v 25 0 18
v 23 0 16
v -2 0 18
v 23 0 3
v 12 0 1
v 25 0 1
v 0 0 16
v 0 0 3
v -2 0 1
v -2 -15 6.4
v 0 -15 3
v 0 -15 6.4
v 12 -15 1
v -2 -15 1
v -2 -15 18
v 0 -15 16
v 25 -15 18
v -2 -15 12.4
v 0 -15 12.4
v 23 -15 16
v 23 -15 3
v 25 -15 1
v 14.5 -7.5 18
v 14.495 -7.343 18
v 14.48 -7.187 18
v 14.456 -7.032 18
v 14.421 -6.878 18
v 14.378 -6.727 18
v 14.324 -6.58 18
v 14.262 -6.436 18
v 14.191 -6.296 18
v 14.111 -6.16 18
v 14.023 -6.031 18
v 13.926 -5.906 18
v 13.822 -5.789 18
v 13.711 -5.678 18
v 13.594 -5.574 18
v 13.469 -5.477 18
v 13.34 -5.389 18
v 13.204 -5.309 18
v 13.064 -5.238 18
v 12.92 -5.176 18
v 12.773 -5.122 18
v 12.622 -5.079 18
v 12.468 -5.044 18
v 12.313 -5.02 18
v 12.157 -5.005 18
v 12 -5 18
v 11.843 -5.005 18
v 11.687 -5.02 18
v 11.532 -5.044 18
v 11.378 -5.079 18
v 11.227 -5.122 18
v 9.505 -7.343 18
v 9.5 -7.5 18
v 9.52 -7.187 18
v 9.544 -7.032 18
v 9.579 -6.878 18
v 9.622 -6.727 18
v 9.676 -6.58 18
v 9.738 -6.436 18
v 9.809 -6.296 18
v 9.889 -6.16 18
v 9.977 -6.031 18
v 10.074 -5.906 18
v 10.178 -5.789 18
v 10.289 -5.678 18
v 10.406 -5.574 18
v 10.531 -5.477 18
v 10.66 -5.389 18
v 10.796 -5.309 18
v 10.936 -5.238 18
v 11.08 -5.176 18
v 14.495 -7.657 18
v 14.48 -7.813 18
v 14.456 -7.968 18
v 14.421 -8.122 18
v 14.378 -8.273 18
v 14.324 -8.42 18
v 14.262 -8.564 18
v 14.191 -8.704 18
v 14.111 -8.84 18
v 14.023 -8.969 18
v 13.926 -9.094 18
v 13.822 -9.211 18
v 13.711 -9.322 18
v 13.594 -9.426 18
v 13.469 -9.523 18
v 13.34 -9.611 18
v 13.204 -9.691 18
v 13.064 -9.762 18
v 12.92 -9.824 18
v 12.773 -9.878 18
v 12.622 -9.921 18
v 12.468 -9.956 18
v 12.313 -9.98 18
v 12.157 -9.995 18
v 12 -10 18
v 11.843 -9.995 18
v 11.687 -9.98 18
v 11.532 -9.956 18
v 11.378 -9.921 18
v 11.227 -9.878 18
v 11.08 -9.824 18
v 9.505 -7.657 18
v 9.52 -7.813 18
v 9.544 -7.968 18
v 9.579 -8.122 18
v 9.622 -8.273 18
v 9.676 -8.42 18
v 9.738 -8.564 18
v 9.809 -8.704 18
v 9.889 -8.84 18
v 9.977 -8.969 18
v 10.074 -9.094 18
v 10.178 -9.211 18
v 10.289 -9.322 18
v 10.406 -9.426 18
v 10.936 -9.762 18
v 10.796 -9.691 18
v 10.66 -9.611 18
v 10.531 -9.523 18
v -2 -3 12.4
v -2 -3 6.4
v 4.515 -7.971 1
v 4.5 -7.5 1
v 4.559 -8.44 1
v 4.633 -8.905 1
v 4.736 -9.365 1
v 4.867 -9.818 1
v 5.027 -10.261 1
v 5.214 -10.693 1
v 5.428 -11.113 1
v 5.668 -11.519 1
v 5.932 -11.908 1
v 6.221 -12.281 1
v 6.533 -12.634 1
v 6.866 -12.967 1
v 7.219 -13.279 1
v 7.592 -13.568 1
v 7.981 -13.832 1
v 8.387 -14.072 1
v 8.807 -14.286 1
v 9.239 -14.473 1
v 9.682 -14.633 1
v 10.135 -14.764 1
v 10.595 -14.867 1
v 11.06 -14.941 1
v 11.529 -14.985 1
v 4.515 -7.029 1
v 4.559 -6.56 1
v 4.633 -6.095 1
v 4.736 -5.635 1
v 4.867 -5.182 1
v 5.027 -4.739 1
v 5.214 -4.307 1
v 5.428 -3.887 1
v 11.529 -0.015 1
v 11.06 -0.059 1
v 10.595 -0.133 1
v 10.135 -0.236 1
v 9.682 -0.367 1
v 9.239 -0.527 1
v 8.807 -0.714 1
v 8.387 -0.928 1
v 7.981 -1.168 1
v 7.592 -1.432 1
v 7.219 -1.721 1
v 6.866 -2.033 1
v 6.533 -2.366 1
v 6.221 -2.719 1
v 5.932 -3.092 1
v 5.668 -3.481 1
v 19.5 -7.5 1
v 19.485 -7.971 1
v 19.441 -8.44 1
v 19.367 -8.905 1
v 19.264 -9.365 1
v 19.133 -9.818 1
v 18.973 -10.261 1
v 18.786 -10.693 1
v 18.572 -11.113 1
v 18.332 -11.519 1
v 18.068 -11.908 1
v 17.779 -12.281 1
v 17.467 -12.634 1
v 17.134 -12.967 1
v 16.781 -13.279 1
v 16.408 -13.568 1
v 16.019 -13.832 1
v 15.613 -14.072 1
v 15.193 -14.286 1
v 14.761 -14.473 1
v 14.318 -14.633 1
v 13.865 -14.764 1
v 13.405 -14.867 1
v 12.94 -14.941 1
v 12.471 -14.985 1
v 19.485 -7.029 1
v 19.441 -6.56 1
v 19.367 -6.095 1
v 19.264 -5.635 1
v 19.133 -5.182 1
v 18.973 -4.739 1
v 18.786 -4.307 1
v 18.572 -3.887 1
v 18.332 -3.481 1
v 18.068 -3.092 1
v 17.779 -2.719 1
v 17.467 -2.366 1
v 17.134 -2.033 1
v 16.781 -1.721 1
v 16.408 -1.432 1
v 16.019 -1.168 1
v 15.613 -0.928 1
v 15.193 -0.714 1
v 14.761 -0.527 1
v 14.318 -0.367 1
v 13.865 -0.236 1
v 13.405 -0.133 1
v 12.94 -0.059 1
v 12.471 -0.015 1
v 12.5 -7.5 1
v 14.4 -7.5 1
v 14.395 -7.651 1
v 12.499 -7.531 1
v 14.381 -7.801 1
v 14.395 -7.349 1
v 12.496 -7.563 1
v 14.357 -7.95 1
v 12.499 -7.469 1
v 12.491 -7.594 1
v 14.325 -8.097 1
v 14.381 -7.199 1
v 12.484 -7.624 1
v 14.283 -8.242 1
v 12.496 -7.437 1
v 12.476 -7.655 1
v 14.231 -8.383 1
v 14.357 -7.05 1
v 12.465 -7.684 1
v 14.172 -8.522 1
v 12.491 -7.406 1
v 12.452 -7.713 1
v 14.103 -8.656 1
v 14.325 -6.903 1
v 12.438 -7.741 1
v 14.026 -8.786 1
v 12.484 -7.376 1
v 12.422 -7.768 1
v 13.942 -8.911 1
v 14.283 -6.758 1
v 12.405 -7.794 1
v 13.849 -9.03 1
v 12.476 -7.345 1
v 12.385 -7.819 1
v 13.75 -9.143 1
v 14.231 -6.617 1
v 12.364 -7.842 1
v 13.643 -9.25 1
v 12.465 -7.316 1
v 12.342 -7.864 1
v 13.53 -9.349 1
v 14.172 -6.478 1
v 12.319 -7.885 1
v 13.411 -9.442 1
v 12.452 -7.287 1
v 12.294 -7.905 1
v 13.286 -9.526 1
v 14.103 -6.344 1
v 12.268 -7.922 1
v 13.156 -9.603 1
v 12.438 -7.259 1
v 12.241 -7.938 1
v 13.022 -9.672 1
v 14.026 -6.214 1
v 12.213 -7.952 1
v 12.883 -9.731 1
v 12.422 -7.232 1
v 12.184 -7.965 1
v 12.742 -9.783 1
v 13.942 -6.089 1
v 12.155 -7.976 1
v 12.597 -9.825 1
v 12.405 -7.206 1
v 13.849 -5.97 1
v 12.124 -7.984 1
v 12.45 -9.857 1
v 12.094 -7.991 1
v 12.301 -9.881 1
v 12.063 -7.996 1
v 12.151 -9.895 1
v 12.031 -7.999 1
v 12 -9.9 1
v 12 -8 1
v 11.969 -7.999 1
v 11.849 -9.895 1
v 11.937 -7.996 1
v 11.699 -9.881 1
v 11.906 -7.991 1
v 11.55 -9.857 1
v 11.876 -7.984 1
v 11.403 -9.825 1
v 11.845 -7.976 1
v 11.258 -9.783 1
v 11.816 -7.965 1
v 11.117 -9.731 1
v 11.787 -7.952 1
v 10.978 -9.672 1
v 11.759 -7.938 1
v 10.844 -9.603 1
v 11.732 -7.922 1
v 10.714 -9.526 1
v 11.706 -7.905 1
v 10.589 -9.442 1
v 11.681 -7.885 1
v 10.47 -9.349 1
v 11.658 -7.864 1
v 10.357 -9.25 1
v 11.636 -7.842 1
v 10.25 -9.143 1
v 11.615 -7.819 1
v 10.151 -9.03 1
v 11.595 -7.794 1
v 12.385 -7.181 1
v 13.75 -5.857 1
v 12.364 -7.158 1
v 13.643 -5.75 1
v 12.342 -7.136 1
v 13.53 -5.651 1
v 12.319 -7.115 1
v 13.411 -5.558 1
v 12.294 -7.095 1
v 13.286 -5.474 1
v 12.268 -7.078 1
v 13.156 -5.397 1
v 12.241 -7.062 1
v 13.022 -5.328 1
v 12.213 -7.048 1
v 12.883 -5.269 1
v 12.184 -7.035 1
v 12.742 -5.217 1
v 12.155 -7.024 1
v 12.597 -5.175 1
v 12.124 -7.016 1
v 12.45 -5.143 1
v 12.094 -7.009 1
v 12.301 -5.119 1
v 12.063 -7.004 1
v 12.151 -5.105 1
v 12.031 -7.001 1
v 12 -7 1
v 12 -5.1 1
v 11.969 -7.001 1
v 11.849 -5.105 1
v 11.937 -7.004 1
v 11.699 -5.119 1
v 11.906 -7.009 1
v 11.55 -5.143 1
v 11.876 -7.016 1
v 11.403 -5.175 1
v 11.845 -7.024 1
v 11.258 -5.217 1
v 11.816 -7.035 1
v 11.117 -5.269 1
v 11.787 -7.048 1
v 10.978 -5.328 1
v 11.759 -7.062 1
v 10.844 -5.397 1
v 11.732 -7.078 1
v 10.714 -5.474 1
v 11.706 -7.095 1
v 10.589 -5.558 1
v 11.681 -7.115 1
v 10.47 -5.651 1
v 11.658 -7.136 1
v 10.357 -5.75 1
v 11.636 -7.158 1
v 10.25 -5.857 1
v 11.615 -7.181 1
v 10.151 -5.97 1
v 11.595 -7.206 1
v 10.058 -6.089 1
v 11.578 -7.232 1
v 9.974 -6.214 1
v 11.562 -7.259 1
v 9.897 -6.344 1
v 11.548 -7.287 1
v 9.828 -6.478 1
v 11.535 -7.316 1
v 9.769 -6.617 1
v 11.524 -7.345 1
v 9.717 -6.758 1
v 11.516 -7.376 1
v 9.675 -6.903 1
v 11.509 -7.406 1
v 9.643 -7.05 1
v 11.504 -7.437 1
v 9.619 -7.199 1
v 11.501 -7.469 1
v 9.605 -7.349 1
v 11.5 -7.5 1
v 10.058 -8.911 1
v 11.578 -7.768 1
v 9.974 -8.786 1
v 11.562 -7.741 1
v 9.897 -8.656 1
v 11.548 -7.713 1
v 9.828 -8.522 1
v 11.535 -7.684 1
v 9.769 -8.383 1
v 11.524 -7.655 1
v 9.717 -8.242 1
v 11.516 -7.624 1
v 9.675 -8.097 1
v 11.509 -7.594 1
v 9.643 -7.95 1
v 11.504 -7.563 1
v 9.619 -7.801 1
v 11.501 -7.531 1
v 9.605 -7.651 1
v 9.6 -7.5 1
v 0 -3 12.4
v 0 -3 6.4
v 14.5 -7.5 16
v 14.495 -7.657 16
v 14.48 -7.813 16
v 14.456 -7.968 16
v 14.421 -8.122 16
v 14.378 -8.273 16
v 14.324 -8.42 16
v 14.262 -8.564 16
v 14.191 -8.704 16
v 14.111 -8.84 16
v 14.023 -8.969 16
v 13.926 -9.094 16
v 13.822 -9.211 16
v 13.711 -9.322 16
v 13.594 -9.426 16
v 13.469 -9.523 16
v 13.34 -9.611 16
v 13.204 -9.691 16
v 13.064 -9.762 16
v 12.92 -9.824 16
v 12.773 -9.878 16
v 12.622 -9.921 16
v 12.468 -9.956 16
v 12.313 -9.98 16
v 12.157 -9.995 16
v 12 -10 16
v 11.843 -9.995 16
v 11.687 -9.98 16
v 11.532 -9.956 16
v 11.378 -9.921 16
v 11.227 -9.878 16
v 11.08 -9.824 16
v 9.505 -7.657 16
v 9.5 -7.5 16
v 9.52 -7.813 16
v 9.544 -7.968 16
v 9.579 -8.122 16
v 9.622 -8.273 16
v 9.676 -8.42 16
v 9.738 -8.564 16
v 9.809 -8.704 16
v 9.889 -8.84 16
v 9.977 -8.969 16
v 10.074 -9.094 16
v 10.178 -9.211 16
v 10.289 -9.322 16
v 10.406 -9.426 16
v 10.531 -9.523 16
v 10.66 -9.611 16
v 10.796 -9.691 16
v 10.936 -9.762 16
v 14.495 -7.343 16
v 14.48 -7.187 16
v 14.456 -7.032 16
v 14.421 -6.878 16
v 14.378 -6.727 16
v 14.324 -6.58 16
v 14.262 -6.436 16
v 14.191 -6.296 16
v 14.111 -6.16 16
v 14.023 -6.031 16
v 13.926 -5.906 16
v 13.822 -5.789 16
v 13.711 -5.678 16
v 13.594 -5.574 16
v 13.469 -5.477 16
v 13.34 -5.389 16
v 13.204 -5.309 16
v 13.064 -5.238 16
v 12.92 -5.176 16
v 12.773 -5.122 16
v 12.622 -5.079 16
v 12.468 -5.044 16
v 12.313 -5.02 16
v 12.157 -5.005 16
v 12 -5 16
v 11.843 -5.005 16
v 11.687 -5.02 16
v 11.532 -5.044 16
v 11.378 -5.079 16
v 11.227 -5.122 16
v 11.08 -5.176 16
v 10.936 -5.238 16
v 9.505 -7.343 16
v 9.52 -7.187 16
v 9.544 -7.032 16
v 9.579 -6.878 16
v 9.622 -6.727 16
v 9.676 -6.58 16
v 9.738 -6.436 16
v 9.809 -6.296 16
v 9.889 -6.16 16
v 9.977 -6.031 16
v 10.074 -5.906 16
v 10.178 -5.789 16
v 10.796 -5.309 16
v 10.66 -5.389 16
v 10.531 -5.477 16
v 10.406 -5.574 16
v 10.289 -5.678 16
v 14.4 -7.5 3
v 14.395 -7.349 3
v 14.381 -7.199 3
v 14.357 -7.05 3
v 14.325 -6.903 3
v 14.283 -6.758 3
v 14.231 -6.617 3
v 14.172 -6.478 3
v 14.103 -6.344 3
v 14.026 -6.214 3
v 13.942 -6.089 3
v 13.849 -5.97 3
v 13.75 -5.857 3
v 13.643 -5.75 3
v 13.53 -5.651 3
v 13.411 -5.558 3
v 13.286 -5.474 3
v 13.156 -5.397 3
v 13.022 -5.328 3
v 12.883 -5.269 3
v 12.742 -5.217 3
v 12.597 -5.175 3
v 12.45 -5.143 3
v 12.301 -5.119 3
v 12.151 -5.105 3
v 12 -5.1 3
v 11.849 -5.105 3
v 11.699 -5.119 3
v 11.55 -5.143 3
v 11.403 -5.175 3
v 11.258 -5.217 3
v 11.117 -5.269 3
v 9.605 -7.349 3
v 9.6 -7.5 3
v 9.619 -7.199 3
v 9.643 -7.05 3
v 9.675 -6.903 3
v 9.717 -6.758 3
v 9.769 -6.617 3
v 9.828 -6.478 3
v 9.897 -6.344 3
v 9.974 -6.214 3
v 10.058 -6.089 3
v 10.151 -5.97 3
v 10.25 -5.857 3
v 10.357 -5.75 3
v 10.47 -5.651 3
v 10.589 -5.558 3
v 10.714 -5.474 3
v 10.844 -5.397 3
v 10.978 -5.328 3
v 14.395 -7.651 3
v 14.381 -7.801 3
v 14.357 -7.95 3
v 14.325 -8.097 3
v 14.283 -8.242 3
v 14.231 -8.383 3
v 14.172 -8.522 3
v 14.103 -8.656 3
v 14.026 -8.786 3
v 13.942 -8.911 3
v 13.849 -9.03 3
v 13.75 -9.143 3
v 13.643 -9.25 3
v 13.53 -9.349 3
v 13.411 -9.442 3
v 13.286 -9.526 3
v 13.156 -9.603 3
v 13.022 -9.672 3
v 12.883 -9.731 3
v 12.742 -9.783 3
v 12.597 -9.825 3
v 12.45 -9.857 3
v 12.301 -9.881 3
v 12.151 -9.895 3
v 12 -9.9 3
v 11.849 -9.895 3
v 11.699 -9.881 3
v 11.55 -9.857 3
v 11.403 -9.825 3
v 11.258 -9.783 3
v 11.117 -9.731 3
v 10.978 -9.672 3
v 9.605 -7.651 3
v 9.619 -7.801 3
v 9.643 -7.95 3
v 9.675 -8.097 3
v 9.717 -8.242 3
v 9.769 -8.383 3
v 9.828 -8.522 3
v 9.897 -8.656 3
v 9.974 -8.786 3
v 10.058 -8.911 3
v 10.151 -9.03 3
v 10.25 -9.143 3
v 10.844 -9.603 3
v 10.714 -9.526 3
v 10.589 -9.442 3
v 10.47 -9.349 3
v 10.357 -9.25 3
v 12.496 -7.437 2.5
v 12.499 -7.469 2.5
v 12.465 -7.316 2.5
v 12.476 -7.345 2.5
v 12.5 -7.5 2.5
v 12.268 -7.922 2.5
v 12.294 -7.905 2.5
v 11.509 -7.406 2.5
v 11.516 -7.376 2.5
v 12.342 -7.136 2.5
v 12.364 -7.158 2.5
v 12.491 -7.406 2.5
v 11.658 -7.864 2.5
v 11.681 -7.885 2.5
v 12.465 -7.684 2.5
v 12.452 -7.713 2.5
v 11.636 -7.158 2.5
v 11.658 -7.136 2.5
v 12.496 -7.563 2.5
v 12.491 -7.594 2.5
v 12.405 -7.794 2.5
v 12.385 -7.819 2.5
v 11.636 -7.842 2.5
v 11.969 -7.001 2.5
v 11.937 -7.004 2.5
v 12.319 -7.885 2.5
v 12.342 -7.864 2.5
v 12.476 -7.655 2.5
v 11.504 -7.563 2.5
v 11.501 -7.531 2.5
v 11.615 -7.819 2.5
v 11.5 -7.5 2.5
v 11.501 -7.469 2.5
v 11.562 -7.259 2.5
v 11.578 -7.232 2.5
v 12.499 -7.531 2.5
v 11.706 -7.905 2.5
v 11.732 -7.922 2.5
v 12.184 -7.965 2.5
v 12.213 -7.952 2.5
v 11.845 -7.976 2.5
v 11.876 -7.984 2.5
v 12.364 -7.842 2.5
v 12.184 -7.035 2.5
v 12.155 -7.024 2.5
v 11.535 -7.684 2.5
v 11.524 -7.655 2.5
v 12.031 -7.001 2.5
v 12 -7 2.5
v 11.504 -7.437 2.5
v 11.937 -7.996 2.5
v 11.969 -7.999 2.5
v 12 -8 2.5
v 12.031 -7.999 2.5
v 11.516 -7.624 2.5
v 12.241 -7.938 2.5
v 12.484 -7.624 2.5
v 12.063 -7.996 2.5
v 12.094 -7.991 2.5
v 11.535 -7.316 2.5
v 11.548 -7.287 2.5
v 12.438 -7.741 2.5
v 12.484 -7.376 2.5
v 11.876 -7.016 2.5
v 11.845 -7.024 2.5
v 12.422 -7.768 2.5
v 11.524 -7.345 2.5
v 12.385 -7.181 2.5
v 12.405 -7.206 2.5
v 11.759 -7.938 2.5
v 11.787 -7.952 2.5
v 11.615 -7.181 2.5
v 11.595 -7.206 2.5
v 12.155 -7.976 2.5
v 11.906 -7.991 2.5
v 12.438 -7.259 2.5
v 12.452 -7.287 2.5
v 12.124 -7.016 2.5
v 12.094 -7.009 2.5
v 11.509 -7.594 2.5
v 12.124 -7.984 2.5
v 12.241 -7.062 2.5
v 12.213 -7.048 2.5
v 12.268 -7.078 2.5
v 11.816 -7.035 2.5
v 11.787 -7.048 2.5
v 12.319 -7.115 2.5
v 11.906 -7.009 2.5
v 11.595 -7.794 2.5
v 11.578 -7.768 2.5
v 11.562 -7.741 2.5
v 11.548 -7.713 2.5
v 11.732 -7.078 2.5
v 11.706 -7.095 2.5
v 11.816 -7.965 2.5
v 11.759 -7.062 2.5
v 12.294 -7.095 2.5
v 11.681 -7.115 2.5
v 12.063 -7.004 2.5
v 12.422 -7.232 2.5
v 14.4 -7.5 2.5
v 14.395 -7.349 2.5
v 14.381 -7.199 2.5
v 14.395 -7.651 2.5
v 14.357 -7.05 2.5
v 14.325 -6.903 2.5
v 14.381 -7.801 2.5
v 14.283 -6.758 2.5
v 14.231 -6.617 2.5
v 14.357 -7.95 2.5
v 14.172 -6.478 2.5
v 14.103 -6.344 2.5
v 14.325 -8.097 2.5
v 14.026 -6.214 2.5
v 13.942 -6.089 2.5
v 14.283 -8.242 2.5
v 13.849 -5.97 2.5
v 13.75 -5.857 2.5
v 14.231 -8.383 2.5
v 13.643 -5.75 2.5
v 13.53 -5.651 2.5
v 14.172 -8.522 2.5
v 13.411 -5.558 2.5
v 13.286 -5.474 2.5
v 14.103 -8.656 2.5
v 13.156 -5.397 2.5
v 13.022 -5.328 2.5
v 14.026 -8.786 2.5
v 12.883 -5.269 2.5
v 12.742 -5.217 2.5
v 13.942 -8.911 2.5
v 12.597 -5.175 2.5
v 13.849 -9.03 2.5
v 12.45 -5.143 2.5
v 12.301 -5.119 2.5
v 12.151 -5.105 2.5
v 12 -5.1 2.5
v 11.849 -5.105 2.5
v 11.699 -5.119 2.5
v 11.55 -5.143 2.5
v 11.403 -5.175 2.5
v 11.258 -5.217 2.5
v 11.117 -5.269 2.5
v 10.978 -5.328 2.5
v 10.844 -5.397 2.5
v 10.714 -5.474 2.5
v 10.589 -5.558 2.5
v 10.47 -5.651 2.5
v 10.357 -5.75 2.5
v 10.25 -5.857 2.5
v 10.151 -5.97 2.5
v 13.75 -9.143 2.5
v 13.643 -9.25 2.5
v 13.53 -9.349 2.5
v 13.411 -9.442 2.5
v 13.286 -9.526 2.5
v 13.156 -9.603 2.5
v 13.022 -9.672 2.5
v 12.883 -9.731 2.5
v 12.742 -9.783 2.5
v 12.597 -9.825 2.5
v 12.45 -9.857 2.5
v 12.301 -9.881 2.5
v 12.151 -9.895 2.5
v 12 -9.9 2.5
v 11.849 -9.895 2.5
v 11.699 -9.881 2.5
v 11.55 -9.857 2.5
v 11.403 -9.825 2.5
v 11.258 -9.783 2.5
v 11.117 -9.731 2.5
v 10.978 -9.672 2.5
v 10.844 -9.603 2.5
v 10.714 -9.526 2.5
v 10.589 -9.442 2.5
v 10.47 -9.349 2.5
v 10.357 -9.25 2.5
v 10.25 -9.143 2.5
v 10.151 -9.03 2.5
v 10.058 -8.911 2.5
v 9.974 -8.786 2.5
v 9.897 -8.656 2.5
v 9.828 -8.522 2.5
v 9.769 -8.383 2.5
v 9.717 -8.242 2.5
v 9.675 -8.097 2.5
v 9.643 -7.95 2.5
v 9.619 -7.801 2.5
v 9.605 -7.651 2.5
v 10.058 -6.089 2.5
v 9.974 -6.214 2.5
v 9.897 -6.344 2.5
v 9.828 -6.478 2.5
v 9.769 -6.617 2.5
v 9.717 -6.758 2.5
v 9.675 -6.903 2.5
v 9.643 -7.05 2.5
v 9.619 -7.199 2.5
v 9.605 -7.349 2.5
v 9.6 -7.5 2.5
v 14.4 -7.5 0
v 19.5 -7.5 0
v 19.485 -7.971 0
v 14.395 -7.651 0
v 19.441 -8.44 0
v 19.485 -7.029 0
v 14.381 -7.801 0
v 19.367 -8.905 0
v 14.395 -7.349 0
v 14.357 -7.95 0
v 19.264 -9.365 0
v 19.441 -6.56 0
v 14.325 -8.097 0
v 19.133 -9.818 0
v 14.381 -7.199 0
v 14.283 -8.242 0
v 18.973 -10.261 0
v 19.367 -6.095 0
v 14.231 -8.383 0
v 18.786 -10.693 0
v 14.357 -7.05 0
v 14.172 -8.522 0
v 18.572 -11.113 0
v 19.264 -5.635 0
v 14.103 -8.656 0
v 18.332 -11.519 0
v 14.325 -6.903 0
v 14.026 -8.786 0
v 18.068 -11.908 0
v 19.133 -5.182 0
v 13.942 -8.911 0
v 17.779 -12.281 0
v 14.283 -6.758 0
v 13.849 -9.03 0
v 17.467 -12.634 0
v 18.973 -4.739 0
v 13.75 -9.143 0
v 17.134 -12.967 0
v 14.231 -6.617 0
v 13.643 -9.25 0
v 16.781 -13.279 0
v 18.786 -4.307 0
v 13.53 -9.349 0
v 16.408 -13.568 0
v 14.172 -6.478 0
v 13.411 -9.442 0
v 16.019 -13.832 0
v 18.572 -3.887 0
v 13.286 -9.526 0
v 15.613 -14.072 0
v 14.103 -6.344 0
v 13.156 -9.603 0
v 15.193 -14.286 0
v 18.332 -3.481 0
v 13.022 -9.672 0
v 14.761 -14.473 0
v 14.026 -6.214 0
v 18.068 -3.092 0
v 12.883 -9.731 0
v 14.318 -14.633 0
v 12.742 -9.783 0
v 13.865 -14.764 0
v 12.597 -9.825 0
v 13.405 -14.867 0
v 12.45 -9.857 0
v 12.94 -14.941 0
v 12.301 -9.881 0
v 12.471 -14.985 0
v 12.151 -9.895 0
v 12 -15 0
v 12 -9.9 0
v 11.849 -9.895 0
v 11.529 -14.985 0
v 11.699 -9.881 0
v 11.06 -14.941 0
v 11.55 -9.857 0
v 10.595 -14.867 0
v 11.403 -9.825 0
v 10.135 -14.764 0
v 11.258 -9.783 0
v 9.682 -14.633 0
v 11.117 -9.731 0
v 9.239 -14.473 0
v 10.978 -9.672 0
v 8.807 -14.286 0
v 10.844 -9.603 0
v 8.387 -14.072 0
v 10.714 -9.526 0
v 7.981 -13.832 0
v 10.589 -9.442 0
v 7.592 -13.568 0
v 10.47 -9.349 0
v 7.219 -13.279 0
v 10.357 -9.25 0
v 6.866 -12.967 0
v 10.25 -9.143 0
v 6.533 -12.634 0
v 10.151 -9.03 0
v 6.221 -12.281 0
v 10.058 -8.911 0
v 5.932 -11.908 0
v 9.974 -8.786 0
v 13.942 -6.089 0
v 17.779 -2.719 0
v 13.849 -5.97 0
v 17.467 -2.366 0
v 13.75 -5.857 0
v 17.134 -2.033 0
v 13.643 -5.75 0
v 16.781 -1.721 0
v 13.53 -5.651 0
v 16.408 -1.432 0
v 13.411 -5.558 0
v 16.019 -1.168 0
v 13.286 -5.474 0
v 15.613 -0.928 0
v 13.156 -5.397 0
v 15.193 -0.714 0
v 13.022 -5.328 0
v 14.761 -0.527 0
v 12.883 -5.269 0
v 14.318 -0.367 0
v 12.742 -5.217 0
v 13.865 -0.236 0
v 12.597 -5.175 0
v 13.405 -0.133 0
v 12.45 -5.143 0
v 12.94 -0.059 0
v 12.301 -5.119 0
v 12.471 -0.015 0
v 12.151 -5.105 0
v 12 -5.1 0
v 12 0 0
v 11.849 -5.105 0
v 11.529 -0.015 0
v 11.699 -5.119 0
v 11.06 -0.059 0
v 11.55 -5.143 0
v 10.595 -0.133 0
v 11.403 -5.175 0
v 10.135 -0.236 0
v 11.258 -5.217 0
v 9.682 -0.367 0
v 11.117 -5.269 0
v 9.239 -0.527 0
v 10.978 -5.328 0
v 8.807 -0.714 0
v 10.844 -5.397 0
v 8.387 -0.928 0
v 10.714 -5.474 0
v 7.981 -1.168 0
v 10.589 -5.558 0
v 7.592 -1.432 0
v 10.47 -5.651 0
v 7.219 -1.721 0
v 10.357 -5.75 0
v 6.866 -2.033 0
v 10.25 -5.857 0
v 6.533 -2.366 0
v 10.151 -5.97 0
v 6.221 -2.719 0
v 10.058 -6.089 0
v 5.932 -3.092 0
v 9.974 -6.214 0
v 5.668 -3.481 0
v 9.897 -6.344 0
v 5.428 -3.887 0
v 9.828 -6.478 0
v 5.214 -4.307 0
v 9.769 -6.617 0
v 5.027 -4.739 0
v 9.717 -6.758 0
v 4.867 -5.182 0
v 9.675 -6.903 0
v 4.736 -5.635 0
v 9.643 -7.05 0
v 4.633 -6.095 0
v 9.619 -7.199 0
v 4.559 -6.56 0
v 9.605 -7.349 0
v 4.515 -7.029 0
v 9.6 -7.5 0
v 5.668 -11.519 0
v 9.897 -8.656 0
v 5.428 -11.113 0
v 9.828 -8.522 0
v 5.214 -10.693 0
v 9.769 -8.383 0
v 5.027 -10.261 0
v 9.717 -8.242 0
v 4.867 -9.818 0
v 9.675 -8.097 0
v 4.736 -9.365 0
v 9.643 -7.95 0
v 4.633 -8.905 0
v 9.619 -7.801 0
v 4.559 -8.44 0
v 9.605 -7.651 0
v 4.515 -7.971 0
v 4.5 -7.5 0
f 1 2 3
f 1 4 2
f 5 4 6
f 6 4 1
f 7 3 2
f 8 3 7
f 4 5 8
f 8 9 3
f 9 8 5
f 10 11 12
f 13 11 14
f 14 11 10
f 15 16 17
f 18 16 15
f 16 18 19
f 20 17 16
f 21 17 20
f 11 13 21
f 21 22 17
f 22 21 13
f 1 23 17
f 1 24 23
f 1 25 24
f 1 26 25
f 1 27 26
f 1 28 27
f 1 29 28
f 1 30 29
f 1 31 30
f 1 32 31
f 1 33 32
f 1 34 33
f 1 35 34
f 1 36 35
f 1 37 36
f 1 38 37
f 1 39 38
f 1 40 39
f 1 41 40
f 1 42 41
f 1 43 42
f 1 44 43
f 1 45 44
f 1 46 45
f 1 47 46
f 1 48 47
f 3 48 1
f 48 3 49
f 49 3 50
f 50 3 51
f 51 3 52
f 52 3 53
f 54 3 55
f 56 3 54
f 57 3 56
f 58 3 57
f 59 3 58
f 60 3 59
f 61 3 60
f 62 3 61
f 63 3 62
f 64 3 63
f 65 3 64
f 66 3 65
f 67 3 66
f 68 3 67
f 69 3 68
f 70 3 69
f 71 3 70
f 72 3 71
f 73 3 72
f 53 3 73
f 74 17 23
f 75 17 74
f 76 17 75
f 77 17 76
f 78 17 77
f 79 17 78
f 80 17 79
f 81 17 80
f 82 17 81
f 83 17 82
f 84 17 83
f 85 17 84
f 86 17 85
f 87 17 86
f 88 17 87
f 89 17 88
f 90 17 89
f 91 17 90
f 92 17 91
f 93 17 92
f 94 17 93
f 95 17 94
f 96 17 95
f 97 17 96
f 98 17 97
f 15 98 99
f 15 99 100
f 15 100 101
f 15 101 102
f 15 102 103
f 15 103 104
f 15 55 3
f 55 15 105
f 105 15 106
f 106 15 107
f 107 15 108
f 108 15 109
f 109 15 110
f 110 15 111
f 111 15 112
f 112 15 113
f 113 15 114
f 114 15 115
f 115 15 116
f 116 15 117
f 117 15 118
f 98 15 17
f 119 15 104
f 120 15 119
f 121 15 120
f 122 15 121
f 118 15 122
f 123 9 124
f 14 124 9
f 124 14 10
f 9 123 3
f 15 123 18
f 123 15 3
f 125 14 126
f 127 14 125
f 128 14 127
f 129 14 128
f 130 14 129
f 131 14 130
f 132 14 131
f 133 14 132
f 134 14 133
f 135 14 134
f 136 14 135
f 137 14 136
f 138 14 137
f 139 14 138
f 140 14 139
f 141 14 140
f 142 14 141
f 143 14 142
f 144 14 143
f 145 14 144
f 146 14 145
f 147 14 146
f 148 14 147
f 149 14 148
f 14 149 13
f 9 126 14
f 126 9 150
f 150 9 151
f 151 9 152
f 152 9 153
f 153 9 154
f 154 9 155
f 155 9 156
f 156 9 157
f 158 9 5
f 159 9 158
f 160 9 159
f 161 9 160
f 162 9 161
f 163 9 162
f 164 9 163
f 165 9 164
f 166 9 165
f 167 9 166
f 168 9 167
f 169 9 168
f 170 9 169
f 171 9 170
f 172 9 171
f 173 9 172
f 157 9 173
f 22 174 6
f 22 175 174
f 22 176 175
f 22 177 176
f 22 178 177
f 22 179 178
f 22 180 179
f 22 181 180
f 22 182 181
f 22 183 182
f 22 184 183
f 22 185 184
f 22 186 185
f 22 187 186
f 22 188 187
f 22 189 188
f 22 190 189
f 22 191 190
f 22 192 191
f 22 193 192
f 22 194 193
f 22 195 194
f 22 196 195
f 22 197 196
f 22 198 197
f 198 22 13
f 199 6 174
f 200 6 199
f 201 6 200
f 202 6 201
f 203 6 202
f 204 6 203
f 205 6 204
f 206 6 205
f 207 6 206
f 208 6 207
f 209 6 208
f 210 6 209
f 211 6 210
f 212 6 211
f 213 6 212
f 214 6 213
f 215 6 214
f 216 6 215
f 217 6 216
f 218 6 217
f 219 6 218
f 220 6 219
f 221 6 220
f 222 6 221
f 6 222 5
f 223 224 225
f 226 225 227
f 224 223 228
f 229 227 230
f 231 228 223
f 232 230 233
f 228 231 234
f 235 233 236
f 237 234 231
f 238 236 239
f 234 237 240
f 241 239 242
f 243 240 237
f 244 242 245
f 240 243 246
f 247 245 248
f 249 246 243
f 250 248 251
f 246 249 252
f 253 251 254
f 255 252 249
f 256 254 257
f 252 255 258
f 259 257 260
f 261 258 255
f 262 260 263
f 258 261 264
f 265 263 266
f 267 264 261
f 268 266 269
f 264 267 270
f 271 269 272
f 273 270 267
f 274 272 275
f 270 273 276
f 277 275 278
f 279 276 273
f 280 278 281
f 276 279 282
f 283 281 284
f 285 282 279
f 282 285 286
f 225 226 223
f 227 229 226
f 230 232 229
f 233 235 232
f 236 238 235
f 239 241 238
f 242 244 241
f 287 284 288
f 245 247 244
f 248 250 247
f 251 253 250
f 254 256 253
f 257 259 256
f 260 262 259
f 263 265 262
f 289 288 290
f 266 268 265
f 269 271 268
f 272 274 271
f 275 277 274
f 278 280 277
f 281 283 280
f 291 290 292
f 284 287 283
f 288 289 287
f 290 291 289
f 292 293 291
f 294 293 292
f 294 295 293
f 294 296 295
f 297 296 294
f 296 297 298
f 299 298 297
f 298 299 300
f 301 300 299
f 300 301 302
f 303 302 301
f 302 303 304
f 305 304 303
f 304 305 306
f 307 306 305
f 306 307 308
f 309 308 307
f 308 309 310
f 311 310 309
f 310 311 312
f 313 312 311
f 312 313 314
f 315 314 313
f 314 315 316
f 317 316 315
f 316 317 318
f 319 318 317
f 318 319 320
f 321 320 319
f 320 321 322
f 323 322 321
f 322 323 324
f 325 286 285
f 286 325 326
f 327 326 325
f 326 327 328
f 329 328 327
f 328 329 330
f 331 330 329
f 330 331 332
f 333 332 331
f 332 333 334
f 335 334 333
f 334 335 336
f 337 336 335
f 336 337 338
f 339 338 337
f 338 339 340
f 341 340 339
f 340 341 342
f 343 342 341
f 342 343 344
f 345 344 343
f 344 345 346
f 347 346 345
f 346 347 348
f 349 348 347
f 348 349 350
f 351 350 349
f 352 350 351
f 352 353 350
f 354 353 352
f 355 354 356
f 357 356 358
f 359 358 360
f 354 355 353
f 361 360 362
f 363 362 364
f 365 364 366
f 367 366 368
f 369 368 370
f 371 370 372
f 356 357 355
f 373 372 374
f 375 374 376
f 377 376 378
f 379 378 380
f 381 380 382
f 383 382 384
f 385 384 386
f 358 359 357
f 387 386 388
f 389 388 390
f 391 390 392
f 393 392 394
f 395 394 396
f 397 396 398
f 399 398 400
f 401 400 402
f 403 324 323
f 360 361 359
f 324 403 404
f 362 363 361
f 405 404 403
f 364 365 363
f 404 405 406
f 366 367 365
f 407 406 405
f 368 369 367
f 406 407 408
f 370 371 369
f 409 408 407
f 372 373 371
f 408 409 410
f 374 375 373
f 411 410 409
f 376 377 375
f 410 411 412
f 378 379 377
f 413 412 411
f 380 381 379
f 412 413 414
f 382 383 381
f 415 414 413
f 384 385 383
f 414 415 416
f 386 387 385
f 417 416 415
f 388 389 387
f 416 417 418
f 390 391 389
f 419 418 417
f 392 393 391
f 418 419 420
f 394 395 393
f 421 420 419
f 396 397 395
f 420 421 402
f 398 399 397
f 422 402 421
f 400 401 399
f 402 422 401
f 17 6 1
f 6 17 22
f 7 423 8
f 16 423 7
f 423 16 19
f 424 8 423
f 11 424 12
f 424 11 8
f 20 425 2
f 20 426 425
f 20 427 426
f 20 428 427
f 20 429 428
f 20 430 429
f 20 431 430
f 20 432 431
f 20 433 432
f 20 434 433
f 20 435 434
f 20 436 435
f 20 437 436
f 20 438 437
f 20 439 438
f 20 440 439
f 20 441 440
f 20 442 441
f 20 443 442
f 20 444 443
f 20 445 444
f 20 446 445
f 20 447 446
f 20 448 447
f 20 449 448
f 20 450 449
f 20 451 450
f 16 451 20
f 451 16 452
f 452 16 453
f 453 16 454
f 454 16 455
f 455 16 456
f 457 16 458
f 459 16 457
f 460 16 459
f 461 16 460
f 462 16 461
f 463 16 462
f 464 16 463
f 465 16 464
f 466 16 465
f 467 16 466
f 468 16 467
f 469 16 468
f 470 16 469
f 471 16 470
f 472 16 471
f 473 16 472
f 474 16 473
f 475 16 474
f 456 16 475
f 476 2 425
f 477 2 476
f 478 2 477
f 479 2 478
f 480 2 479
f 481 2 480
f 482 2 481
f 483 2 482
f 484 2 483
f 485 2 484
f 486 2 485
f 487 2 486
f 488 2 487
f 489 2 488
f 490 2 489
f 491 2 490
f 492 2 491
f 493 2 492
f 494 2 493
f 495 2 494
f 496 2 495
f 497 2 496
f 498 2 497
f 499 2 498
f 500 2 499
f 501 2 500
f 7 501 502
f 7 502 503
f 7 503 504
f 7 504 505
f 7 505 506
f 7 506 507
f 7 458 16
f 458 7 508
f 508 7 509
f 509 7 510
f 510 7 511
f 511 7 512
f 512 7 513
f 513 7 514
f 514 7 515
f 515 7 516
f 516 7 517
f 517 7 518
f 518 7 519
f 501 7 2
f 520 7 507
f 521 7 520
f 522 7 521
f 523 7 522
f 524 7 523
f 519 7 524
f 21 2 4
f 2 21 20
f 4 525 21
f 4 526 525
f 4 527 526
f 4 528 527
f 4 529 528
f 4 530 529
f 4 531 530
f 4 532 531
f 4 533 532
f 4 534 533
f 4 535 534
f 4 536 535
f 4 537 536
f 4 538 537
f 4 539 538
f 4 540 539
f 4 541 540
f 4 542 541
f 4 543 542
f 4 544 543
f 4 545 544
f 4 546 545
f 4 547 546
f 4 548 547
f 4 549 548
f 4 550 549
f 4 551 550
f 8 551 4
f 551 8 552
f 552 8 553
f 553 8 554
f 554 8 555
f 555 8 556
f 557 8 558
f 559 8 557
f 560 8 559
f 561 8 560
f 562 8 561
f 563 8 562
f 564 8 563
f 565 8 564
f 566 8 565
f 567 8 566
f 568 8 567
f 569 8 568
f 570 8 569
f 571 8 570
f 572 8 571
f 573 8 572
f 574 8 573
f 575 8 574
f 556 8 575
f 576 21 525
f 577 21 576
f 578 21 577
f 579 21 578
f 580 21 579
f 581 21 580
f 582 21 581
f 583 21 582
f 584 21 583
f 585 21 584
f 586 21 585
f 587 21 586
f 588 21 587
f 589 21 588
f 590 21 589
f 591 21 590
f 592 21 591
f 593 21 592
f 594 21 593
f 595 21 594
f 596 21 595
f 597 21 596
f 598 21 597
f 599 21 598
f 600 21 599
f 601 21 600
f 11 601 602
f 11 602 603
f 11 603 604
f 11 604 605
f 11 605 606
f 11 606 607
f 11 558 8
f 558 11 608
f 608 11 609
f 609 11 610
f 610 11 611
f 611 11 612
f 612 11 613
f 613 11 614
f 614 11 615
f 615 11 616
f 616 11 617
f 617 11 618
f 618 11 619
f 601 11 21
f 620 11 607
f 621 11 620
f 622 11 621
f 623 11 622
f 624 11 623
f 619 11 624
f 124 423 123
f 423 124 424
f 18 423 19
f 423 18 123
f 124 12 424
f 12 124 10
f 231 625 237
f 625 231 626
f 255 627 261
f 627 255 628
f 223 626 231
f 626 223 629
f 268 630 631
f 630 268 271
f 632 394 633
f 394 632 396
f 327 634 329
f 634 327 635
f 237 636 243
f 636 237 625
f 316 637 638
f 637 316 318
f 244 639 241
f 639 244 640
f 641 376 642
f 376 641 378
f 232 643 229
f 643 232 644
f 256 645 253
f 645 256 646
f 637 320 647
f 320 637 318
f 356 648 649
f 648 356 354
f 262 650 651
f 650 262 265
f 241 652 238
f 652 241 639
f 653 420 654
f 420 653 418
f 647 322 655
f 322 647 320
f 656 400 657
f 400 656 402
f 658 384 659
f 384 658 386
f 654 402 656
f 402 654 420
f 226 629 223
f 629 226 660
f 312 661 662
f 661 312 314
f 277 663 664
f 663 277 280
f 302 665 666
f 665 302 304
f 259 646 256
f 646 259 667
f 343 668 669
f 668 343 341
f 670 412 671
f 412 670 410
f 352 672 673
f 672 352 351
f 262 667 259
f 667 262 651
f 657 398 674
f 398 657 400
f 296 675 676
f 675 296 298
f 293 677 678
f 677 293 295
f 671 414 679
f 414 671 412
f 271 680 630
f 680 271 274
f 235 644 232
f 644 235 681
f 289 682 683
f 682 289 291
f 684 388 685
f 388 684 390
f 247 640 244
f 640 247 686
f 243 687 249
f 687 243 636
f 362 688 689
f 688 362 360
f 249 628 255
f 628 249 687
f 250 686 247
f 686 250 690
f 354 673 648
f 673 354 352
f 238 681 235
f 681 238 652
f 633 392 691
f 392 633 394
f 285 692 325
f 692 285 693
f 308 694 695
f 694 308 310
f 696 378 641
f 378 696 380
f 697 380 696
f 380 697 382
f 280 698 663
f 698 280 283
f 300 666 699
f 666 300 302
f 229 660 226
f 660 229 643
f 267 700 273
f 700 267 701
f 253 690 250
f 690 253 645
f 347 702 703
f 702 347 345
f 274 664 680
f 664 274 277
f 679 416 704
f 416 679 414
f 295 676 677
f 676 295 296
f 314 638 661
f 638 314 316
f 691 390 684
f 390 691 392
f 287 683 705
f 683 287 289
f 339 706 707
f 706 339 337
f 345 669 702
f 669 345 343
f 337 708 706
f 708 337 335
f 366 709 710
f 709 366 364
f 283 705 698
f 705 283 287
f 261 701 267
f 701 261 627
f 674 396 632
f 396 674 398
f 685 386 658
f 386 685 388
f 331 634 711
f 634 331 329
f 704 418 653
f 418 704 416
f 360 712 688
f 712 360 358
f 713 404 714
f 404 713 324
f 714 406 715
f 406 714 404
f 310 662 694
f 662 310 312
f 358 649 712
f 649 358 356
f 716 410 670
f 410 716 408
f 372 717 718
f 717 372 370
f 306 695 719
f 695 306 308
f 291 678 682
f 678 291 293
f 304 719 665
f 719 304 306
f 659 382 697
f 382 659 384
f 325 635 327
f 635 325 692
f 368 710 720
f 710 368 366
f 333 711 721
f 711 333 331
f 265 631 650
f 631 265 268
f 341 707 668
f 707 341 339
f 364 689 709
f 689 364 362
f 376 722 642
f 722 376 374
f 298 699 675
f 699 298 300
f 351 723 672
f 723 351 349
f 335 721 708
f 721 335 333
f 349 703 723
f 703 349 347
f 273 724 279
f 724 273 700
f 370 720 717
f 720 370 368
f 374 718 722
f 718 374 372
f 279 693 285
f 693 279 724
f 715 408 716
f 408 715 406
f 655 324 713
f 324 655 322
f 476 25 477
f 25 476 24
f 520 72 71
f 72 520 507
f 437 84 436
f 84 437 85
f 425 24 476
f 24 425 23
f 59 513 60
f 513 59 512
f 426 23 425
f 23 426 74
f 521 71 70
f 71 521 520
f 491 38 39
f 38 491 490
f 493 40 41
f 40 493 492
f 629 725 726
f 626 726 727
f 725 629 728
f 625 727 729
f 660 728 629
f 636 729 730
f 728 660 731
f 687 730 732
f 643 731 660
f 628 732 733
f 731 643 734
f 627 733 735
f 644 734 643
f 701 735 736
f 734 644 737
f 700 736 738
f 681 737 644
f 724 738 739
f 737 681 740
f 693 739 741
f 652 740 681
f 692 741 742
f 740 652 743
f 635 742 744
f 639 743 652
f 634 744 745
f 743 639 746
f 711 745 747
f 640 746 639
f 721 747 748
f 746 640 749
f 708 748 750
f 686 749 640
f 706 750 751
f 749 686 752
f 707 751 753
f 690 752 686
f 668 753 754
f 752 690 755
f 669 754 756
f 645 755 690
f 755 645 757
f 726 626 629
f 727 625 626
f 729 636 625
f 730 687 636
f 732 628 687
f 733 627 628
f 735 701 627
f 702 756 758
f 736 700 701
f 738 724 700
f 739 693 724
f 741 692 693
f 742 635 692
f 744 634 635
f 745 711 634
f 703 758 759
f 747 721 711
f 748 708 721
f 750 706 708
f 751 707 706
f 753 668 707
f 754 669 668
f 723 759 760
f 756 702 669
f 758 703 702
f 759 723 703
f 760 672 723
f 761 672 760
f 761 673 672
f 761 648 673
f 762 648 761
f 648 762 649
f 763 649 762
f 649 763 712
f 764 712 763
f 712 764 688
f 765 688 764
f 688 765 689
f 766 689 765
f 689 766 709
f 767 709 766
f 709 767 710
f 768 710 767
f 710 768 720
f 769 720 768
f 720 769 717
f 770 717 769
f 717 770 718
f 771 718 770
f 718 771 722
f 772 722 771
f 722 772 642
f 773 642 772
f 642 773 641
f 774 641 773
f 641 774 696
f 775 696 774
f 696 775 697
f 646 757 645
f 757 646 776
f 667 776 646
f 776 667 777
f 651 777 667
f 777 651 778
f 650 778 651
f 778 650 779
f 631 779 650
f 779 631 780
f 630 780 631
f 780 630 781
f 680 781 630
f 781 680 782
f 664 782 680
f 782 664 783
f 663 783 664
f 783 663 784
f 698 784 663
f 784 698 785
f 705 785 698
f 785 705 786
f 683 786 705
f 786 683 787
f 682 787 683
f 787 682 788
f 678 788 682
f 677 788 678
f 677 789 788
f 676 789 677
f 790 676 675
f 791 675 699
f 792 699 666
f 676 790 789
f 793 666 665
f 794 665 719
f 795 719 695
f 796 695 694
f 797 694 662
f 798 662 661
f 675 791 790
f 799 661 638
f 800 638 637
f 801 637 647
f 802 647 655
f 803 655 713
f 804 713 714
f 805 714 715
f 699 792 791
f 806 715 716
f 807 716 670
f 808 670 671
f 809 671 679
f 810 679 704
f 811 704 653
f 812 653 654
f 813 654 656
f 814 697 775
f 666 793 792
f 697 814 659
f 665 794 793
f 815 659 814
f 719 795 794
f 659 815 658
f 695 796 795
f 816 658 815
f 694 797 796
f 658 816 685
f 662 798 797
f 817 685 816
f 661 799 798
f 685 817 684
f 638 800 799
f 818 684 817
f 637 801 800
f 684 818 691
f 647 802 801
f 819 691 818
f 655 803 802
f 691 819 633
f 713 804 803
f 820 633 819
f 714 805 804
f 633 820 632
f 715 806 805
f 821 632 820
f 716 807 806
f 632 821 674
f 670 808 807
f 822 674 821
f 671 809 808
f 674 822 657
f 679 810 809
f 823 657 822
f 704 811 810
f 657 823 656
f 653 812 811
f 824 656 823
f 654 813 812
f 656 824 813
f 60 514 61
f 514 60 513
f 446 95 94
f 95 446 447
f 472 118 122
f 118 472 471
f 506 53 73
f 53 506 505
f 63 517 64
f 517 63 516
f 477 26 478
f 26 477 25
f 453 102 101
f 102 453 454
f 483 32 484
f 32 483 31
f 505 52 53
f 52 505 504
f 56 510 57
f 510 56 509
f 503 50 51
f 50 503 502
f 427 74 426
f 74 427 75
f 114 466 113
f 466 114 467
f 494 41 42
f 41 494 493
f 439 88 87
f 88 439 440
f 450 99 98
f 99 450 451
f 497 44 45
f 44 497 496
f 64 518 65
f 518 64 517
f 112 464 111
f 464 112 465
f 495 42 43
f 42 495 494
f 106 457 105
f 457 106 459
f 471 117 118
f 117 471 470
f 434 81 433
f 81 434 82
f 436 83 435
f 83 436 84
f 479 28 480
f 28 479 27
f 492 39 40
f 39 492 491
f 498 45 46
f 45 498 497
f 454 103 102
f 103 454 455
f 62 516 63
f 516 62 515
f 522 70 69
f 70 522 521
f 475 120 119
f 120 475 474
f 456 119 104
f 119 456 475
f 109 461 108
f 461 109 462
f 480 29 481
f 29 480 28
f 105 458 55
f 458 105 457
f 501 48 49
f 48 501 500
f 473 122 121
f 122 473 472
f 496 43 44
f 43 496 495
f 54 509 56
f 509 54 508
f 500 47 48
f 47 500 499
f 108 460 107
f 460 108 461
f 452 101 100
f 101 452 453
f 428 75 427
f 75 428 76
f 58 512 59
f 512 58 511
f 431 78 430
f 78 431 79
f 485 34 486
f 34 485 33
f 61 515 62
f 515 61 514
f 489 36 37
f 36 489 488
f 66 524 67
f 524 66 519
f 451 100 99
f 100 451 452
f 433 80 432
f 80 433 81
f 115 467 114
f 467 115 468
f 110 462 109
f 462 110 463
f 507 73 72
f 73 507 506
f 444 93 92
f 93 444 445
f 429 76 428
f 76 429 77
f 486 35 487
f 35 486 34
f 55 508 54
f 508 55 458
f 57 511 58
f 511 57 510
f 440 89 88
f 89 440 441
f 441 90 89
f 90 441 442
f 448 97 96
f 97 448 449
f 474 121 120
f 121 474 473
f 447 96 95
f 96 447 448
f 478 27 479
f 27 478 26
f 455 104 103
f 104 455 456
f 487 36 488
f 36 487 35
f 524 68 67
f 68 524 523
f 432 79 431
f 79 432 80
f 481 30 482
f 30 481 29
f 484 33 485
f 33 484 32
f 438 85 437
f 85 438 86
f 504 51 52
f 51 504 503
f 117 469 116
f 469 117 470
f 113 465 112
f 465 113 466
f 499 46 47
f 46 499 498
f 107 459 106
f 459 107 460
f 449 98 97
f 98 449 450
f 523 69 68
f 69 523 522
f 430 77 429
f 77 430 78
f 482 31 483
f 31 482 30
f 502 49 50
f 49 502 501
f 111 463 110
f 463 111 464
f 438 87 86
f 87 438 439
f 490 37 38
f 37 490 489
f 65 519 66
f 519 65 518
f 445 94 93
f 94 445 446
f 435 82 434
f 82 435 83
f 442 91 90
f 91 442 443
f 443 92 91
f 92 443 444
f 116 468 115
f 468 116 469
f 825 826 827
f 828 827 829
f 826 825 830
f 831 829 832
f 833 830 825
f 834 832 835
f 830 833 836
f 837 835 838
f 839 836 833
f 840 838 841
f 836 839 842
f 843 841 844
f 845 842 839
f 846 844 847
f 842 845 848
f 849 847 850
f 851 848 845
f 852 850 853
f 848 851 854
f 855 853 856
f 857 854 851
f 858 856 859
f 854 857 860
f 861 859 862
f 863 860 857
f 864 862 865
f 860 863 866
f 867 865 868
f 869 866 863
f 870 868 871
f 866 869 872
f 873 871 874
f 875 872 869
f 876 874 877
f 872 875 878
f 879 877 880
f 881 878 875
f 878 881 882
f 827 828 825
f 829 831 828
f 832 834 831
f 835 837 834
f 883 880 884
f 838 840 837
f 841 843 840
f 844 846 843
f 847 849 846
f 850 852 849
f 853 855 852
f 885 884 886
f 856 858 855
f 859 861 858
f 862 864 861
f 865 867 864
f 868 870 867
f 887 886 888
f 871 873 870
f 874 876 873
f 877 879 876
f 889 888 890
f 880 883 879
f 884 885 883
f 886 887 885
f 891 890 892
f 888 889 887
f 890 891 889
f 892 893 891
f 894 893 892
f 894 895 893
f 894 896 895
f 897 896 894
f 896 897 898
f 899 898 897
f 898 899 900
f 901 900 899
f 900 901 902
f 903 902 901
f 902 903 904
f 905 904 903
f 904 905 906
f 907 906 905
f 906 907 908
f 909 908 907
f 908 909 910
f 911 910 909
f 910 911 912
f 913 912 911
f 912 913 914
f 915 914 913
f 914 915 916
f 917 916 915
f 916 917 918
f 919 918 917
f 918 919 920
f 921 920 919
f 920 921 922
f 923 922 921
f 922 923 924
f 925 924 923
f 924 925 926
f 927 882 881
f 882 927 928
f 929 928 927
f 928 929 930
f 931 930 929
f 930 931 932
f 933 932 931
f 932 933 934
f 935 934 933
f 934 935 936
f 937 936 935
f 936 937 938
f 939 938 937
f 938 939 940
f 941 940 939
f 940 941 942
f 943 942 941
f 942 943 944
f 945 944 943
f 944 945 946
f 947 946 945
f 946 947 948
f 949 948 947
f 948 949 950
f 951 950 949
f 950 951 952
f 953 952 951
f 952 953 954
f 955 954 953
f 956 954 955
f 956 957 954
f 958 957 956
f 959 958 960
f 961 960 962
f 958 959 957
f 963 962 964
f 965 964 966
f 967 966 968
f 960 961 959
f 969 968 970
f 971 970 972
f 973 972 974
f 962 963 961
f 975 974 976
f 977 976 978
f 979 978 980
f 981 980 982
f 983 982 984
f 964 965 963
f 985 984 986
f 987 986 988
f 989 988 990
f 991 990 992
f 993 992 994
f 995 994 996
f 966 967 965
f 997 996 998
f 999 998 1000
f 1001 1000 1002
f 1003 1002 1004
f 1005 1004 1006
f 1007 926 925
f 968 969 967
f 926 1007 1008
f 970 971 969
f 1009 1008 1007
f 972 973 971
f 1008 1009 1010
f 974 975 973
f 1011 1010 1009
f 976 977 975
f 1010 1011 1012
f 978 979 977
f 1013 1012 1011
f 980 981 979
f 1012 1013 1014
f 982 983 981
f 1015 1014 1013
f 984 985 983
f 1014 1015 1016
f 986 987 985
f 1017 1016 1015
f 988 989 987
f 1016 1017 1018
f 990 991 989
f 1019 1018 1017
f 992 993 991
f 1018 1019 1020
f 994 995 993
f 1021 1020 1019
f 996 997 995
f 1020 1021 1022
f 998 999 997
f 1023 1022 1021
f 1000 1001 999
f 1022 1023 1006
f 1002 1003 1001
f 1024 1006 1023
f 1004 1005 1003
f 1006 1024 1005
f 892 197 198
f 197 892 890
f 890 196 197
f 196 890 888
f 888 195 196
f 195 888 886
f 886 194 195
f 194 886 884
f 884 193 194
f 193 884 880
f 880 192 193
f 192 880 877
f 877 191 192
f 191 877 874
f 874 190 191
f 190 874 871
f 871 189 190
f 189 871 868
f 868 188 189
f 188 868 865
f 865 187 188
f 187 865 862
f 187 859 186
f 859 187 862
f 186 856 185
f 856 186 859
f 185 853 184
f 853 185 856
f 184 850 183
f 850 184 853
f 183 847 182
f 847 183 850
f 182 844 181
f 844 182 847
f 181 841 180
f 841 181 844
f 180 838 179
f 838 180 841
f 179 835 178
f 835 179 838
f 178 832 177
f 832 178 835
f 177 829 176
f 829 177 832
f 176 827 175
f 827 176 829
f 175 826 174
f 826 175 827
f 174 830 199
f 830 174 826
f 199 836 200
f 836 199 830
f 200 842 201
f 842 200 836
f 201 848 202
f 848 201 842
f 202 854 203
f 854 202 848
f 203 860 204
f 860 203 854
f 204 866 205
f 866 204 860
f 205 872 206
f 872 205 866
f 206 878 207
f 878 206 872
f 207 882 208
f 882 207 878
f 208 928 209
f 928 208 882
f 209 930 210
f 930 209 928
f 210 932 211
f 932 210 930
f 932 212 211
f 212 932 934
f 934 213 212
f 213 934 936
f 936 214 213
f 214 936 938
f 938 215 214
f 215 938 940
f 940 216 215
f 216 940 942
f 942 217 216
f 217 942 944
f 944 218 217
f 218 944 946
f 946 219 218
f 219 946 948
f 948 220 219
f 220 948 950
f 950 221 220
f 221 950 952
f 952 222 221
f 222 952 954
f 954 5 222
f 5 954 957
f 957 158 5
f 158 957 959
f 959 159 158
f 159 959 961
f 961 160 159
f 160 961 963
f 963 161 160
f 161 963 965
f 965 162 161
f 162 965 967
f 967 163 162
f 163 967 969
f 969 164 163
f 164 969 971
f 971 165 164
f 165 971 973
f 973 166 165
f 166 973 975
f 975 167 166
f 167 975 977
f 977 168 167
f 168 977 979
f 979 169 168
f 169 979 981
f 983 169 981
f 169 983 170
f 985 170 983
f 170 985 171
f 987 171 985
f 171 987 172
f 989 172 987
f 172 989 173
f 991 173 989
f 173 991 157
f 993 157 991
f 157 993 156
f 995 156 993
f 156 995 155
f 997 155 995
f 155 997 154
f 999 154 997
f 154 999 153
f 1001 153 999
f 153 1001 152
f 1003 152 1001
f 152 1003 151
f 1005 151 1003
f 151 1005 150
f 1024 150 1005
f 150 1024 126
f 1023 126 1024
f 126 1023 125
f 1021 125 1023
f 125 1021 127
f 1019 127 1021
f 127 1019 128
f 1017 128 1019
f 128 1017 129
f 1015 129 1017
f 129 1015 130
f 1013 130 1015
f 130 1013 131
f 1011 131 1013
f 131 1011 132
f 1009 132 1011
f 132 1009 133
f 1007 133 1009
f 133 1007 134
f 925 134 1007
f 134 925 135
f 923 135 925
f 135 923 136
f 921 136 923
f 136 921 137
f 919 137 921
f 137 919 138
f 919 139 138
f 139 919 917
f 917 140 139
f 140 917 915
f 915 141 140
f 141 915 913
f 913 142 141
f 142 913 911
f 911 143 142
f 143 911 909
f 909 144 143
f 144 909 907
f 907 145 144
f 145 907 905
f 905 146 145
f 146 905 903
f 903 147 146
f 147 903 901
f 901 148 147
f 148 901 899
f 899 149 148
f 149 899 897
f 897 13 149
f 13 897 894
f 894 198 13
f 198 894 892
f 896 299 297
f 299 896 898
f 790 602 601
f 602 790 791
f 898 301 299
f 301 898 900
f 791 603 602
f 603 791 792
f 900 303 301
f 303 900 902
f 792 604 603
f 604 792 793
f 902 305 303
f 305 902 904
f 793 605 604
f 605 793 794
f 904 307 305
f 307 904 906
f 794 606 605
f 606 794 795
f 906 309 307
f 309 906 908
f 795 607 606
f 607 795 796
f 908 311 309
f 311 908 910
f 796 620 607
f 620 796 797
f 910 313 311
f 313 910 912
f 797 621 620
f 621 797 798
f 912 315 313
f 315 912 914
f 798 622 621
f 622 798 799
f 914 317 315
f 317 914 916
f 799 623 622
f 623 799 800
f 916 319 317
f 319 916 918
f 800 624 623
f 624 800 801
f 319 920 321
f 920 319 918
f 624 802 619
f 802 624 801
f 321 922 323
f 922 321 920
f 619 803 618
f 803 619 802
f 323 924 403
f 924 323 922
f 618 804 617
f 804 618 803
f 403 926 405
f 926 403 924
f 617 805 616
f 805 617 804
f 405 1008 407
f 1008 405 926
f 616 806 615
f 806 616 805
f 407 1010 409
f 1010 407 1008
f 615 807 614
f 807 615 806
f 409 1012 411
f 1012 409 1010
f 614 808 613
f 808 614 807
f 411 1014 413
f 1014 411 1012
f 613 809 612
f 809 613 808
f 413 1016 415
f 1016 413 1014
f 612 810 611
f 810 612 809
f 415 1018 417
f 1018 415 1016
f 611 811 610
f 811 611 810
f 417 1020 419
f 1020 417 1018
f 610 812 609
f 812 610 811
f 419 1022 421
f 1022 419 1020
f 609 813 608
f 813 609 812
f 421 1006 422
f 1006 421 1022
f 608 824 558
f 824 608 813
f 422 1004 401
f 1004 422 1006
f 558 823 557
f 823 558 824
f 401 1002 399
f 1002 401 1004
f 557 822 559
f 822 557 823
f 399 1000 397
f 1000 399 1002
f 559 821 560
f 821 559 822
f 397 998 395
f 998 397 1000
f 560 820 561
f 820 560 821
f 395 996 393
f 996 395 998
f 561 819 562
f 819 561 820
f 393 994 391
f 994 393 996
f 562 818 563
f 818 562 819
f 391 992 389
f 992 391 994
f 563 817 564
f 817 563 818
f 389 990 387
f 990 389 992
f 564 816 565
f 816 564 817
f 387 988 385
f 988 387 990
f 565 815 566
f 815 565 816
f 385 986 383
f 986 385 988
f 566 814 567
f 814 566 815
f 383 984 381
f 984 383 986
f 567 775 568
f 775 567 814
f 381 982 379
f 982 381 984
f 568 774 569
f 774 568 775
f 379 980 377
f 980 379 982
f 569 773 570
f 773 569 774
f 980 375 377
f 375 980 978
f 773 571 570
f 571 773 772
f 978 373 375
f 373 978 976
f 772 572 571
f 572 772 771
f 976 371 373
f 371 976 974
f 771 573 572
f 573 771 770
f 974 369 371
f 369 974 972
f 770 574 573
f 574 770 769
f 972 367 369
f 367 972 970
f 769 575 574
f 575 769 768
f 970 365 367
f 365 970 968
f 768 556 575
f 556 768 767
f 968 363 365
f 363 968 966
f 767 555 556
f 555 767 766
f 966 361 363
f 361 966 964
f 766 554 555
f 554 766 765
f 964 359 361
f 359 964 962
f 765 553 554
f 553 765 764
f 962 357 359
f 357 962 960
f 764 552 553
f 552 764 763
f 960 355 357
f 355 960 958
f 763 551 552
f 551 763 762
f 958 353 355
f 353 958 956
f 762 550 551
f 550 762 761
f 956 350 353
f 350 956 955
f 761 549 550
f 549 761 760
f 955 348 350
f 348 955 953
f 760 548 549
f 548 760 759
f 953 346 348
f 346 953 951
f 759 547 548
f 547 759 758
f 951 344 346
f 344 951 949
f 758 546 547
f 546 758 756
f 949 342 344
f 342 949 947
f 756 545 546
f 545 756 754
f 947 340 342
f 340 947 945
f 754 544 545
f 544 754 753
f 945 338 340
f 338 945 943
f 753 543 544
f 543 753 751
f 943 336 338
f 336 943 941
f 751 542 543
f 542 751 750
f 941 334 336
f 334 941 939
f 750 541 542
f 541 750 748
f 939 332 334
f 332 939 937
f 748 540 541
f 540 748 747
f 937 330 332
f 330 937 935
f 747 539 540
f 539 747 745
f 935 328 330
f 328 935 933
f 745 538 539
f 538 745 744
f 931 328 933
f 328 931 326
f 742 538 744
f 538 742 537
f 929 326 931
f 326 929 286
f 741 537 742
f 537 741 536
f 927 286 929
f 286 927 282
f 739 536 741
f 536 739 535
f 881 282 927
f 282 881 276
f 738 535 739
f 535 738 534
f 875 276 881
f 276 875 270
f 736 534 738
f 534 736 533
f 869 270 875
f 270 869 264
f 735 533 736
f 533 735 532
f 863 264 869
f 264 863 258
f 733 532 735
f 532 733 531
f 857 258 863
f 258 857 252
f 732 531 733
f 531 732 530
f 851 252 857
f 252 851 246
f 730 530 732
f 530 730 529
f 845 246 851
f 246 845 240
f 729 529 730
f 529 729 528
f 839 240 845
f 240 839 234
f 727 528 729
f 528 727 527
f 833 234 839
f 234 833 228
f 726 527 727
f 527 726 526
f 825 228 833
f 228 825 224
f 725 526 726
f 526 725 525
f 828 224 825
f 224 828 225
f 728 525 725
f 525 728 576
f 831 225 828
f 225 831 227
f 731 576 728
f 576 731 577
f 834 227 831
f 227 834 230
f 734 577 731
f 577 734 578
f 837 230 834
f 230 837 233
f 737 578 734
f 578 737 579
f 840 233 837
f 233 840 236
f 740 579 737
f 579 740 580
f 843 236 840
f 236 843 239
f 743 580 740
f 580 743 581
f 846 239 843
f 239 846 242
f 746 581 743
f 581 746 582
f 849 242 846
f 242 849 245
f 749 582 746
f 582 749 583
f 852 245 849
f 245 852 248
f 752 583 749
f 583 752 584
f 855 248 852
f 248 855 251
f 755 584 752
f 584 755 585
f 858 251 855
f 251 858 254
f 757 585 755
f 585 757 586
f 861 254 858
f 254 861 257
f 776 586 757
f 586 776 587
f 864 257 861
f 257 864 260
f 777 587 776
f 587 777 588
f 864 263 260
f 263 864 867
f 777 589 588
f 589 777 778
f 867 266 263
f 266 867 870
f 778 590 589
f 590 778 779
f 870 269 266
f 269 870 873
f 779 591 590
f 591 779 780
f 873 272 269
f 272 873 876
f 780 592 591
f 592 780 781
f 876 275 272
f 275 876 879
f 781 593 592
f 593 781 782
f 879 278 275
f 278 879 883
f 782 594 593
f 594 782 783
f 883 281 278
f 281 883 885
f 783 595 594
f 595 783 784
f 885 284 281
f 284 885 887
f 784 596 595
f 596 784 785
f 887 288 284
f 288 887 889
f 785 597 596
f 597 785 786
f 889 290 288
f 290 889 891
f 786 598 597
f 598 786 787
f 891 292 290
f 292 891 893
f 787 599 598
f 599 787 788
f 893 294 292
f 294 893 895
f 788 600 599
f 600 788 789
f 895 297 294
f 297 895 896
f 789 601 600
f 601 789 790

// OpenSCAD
$fn=100;

translate([12,-7.5,0]){
linear_extrude(3)
difference(){
circle(15/2);
circle(4.8/2);
}     
}


difference(){
 difference(){
translate([0,0,3])
rotate([90,0,0])
difference(){
linear_extrude(15) difference(){
translate([-2,-2,0])  square([27,17]);
square([23,13]);
}   
translate([-2,3.4,3]) linear_extrude(12) 
square([8,6]);
}
translate([12,-7.5,0]) linear_extrude(18) circle(1/2);
}

translate([12,-7.5,2.5]) linear_extrude(18)
circle(2.5);
}
